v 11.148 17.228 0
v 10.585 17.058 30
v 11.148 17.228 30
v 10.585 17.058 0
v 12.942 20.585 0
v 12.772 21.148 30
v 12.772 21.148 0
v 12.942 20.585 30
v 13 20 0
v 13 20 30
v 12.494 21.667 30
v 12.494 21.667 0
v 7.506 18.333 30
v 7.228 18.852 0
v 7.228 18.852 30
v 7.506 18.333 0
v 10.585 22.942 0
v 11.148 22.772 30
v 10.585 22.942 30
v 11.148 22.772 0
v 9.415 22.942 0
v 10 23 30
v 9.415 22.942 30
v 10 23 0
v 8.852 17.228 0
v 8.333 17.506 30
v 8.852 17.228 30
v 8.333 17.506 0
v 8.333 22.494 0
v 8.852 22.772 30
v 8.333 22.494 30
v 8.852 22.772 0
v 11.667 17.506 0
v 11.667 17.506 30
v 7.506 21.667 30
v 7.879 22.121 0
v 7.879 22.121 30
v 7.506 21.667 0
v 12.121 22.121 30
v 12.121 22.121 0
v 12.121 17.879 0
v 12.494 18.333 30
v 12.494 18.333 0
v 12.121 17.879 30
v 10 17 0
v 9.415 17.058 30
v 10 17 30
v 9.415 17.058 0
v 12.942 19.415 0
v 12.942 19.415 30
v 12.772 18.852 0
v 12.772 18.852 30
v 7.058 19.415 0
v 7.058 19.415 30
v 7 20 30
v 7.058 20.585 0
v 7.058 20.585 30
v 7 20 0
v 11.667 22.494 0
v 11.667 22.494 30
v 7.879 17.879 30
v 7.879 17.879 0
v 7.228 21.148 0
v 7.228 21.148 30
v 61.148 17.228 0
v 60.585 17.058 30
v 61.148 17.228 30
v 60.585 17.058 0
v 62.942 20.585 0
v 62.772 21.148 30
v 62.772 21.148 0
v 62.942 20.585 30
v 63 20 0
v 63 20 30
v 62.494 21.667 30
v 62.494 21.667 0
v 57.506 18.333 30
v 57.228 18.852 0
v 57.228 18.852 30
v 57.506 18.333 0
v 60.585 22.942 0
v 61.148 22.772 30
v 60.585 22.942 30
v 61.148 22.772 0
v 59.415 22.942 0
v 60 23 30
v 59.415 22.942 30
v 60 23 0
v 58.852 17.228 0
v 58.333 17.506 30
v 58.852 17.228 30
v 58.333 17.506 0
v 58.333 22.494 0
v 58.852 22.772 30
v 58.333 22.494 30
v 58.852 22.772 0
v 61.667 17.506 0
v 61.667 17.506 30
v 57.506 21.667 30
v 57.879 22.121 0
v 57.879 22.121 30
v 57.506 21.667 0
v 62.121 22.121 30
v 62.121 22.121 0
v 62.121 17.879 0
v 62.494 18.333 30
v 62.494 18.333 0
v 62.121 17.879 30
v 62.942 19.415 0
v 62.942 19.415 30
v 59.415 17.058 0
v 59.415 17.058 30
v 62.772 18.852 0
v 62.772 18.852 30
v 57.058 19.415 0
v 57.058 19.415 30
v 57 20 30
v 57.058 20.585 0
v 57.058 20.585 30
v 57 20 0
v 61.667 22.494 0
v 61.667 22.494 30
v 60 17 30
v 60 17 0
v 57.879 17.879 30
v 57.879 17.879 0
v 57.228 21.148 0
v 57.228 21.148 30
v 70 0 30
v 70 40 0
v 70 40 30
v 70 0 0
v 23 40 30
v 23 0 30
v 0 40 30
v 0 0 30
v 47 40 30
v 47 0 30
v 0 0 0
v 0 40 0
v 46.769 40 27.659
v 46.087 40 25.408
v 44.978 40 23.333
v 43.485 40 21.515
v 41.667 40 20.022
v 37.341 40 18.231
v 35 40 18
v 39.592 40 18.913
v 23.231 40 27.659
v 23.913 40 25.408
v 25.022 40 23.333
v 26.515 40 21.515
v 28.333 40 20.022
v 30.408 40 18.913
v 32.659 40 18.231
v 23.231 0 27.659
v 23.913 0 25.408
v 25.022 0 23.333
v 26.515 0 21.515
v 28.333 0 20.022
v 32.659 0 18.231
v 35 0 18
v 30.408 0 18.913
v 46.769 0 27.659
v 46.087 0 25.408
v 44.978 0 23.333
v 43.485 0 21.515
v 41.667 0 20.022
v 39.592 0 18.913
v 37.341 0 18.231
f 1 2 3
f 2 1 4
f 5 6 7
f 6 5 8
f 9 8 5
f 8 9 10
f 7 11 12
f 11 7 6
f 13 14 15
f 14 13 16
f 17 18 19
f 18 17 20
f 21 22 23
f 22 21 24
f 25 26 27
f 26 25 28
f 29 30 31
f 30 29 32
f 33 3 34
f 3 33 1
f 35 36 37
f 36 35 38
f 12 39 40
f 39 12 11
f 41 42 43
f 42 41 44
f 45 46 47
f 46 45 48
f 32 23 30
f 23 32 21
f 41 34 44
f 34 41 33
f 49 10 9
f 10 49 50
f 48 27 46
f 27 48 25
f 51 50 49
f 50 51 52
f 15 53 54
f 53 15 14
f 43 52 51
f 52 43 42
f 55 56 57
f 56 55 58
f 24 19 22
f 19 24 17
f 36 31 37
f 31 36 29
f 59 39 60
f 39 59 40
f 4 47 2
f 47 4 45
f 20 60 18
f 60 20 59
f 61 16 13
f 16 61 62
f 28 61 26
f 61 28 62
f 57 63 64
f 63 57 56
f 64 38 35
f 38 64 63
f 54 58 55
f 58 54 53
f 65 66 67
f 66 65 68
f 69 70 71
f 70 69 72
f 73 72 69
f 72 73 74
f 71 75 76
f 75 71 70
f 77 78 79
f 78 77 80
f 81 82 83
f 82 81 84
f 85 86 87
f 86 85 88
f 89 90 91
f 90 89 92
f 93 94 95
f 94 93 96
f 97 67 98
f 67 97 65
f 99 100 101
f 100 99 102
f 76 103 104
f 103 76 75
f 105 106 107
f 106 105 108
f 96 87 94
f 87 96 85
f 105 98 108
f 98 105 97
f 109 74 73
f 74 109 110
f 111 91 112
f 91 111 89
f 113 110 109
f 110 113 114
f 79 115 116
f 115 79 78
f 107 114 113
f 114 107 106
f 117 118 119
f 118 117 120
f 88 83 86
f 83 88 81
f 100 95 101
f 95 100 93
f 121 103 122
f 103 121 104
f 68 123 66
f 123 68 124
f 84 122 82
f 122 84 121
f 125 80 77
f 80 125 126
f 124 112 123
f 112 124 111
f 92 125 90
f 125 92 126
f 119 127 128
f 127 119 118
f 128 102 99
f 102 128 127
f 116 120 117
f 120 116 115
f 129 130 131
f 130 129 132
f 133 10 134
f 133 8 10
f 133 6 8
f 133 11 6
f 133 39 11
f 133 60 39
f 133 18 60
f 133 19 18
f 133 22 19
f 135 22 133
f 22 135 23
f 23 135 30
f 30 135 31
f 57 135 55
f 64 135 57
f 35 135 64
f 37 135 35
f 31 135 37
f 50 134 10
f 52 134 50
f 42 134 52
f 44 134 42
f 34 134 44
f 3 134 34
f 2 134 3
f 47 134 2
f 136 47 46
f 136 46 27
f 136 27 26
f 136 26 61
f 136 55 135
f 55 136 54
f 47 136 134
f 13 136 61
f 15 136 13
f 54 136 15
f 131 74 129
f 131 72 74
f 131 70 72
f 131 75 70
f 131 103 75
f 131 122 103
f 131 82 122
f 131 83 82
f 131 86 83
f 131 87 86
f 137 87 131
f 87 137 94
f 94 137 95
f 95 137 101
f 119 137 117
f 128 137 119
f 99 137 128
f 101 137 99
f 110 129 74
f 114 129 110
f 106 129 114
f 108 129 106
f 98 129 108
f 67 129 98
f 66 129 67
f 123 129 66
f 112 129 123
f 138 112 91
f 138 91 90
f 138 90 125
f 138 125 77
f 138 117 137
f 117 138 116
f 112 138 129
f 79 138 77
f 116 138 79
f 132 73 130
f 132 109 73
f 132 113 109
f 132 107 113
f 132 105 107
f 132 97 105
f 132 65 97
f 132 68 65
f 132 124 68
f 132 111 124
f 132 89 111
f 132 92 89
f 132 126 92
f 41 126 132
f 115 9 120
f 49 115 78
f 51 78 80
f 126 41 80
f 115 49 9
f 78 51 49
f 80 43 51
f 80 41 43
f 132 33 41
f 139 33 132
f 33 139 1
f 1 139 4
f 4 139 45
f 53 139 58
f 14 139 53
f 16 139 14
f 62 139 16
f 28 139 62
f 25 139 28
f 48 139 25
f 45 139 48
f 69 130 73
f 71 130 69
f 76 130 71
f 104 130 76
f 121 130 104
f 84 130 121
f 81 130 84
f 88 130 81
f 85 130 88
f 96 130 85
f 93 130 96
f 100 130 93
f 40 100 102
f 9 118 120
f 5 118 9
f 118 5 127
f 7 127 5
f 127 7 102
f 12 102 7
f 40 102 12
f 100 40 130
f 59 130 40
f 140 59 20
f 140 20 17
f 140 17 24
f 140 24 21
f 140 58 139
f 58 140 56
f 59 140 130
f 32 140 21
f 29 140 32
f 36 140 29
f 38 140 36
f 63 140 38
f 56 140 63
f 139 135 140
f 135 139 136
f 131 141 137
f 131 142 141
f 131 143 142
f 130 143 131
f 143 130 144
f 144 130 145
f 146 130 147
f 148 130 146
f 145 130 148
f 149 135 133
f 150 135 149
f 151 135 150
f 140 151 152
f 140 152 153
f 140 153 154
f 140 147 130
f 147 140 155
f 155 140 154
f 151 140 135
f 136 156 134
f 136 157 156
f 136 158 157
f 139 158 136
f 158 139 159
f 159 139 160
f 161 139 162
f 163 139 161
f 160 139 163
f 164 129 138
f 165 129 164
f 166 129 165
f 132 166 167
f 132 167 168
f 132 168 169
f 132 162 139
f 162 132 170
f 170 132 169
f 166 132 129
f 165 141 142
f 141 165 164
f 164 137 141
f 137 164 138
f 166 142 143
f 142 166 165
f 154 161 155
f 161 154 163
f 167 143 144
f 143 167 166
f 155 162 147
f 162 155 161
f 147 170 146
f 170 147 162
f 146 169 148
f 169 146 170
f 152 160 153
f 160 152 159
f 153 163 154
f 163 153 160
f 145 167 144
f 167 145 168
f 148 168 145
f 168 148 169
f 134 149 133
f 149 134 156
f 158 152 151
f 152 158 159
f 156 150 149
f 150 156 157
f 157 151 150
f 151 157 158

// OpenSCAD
$fn = 32;

// ----------------------------------------------------------------------
// Saddle clamp: plain shaft clamp
// ----------------------------------------------------------------------

// --- parameters (mm) ---
blk_l = 70;               // block length, X
blk_w = 40;               // block width, Y
blk_h = 30;               // block height
clamp_r = 12;             // shaft groove radius
hole_r = 3;               // bolt hole radius
hole_m = 10;              // bolt hole margin from the ends

saw_depth = clamp_r + 3;  // saw kerf depth

difference() {
  cube([blk_l, blk_w, blk_h]);
  translate([blk_l / 2, -1, blk_h])
    rotate([-90, 0, 0])
      cylinder(h = blk_w + 2, r = clamp_r);
  for (sx = [0, 1])
    translate([sx ? blk_l - hole_m : hole_m, blk_w / 2, -1])
      cylinder(r = hole_r, h = blk_h + 2);
}
